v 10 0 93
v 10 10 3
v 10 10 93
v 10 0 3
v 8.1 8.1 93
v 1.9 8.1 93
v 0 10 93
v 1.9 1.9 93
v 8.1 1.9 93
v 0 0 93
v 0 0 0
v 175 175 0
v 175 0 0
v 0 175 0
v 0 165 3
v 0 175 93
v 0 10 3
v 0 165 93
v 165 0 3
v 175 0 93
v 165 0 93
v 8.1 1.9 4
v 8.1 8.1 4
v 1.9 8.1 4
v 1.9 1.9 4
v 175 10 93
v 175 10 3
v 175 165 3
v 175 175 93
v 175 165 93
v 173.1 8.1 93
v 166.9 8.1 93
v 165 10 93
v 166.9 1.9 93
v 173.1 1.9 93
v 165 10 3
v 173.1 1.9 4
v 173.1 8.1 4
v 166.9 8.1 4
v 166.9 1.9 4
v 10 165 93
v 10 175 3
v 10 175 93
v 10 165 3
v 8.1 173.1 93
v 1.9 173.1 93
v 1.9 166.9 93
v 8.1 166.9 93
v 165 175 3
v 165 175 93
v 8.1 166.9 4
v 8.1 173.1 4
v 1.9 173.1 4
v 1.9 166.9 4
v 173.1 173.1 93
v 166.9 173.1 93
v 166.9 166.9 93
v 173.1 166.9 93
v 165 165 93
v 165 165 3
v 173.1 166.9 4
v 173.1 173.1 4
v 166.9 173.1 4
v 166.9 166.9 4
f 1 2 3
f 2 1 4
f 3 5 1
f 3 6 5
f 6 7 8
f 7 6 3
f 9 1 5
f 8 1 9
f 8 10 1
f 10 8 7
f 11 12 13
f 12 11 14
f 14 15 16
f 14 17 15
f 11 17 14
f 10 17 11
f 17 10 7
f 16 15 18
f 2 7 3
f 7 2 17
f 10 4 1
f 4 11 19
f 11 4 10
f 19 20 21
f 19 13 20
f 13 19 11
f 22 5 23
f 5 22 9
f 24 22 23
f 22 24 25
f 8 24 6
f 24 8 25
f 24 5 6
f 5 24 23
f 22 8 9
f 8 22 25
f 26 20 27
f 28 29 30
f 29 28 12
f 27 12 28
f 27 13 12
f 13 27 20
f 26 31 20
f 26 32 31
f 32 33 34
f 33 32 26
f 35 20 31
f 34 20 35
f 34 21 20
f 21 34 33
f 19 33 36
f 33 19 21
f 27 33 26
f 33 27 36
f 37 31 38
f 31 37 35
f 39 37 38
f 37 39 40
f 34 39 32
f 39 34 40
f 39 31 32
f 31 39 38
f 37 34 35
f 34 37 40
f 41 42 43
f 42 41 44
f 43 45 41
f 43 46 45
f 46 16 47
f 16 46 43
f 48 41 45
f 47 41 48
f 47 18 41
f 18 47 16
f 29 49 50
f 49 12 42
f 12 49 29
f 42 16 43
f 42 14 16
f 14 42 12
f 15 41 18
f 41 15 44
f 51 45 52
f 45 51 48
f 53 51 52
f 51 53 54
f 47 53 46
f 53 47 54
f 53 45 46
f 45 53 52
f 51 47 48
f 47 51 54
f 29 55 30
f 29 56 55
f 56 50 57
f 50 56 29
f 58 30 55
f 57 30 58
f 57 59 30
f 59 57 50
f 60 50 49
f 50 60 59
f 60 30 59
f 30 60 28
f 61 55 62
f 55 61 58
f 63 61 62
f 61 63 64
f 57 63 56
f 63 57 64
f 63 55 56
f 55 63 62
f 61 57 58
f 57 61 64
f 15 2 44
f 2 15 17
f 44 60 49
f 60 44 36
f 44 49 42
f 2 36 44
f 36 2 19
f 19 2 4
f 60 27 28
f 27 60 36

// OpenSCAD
insideWidth=155; 
insideLength=155;
insideHeight=90;


topThick=3; // thicknes of the top
pillarWidth=10; // width of the pillars

/*[Hidden]*/
pillarWallThick=1.9;
pillarInner = pillarWidth-(pillarWallThick*2);


outsideWidth=insideWidth+(pillarWidth*2); // insidewidth 150, outside width wil be 182 
outsideLength=insideLength+(pillarWidth*2);// as above - i.e 32mm wider outside than inside.



cube ([outsideLength, outsideWidth, topThick]); // baseplate

pillar();

translate([outsideLength-pillarWidth,0,0])
pillar(); // second corner suport

translate([0,outsideWidth-pillarWidth,0])
pillar(); // third corner suport

translate([outsideLength-pillarWidth,outsideWidth-pillarWidth,0])
pillar(); // fourth corner suport   




module pillar(){ // one to go in each corner
    difference(){
        cube ([pillarWidth,pillarWidth,insideHeight+topThick]);
            translate ([pillarWallThick,pillarWallThick,topThick+1])
                cube ([pillarInner,pillarInner,insideHeight]);

    } // end of difference
        
}// end of module pillar
